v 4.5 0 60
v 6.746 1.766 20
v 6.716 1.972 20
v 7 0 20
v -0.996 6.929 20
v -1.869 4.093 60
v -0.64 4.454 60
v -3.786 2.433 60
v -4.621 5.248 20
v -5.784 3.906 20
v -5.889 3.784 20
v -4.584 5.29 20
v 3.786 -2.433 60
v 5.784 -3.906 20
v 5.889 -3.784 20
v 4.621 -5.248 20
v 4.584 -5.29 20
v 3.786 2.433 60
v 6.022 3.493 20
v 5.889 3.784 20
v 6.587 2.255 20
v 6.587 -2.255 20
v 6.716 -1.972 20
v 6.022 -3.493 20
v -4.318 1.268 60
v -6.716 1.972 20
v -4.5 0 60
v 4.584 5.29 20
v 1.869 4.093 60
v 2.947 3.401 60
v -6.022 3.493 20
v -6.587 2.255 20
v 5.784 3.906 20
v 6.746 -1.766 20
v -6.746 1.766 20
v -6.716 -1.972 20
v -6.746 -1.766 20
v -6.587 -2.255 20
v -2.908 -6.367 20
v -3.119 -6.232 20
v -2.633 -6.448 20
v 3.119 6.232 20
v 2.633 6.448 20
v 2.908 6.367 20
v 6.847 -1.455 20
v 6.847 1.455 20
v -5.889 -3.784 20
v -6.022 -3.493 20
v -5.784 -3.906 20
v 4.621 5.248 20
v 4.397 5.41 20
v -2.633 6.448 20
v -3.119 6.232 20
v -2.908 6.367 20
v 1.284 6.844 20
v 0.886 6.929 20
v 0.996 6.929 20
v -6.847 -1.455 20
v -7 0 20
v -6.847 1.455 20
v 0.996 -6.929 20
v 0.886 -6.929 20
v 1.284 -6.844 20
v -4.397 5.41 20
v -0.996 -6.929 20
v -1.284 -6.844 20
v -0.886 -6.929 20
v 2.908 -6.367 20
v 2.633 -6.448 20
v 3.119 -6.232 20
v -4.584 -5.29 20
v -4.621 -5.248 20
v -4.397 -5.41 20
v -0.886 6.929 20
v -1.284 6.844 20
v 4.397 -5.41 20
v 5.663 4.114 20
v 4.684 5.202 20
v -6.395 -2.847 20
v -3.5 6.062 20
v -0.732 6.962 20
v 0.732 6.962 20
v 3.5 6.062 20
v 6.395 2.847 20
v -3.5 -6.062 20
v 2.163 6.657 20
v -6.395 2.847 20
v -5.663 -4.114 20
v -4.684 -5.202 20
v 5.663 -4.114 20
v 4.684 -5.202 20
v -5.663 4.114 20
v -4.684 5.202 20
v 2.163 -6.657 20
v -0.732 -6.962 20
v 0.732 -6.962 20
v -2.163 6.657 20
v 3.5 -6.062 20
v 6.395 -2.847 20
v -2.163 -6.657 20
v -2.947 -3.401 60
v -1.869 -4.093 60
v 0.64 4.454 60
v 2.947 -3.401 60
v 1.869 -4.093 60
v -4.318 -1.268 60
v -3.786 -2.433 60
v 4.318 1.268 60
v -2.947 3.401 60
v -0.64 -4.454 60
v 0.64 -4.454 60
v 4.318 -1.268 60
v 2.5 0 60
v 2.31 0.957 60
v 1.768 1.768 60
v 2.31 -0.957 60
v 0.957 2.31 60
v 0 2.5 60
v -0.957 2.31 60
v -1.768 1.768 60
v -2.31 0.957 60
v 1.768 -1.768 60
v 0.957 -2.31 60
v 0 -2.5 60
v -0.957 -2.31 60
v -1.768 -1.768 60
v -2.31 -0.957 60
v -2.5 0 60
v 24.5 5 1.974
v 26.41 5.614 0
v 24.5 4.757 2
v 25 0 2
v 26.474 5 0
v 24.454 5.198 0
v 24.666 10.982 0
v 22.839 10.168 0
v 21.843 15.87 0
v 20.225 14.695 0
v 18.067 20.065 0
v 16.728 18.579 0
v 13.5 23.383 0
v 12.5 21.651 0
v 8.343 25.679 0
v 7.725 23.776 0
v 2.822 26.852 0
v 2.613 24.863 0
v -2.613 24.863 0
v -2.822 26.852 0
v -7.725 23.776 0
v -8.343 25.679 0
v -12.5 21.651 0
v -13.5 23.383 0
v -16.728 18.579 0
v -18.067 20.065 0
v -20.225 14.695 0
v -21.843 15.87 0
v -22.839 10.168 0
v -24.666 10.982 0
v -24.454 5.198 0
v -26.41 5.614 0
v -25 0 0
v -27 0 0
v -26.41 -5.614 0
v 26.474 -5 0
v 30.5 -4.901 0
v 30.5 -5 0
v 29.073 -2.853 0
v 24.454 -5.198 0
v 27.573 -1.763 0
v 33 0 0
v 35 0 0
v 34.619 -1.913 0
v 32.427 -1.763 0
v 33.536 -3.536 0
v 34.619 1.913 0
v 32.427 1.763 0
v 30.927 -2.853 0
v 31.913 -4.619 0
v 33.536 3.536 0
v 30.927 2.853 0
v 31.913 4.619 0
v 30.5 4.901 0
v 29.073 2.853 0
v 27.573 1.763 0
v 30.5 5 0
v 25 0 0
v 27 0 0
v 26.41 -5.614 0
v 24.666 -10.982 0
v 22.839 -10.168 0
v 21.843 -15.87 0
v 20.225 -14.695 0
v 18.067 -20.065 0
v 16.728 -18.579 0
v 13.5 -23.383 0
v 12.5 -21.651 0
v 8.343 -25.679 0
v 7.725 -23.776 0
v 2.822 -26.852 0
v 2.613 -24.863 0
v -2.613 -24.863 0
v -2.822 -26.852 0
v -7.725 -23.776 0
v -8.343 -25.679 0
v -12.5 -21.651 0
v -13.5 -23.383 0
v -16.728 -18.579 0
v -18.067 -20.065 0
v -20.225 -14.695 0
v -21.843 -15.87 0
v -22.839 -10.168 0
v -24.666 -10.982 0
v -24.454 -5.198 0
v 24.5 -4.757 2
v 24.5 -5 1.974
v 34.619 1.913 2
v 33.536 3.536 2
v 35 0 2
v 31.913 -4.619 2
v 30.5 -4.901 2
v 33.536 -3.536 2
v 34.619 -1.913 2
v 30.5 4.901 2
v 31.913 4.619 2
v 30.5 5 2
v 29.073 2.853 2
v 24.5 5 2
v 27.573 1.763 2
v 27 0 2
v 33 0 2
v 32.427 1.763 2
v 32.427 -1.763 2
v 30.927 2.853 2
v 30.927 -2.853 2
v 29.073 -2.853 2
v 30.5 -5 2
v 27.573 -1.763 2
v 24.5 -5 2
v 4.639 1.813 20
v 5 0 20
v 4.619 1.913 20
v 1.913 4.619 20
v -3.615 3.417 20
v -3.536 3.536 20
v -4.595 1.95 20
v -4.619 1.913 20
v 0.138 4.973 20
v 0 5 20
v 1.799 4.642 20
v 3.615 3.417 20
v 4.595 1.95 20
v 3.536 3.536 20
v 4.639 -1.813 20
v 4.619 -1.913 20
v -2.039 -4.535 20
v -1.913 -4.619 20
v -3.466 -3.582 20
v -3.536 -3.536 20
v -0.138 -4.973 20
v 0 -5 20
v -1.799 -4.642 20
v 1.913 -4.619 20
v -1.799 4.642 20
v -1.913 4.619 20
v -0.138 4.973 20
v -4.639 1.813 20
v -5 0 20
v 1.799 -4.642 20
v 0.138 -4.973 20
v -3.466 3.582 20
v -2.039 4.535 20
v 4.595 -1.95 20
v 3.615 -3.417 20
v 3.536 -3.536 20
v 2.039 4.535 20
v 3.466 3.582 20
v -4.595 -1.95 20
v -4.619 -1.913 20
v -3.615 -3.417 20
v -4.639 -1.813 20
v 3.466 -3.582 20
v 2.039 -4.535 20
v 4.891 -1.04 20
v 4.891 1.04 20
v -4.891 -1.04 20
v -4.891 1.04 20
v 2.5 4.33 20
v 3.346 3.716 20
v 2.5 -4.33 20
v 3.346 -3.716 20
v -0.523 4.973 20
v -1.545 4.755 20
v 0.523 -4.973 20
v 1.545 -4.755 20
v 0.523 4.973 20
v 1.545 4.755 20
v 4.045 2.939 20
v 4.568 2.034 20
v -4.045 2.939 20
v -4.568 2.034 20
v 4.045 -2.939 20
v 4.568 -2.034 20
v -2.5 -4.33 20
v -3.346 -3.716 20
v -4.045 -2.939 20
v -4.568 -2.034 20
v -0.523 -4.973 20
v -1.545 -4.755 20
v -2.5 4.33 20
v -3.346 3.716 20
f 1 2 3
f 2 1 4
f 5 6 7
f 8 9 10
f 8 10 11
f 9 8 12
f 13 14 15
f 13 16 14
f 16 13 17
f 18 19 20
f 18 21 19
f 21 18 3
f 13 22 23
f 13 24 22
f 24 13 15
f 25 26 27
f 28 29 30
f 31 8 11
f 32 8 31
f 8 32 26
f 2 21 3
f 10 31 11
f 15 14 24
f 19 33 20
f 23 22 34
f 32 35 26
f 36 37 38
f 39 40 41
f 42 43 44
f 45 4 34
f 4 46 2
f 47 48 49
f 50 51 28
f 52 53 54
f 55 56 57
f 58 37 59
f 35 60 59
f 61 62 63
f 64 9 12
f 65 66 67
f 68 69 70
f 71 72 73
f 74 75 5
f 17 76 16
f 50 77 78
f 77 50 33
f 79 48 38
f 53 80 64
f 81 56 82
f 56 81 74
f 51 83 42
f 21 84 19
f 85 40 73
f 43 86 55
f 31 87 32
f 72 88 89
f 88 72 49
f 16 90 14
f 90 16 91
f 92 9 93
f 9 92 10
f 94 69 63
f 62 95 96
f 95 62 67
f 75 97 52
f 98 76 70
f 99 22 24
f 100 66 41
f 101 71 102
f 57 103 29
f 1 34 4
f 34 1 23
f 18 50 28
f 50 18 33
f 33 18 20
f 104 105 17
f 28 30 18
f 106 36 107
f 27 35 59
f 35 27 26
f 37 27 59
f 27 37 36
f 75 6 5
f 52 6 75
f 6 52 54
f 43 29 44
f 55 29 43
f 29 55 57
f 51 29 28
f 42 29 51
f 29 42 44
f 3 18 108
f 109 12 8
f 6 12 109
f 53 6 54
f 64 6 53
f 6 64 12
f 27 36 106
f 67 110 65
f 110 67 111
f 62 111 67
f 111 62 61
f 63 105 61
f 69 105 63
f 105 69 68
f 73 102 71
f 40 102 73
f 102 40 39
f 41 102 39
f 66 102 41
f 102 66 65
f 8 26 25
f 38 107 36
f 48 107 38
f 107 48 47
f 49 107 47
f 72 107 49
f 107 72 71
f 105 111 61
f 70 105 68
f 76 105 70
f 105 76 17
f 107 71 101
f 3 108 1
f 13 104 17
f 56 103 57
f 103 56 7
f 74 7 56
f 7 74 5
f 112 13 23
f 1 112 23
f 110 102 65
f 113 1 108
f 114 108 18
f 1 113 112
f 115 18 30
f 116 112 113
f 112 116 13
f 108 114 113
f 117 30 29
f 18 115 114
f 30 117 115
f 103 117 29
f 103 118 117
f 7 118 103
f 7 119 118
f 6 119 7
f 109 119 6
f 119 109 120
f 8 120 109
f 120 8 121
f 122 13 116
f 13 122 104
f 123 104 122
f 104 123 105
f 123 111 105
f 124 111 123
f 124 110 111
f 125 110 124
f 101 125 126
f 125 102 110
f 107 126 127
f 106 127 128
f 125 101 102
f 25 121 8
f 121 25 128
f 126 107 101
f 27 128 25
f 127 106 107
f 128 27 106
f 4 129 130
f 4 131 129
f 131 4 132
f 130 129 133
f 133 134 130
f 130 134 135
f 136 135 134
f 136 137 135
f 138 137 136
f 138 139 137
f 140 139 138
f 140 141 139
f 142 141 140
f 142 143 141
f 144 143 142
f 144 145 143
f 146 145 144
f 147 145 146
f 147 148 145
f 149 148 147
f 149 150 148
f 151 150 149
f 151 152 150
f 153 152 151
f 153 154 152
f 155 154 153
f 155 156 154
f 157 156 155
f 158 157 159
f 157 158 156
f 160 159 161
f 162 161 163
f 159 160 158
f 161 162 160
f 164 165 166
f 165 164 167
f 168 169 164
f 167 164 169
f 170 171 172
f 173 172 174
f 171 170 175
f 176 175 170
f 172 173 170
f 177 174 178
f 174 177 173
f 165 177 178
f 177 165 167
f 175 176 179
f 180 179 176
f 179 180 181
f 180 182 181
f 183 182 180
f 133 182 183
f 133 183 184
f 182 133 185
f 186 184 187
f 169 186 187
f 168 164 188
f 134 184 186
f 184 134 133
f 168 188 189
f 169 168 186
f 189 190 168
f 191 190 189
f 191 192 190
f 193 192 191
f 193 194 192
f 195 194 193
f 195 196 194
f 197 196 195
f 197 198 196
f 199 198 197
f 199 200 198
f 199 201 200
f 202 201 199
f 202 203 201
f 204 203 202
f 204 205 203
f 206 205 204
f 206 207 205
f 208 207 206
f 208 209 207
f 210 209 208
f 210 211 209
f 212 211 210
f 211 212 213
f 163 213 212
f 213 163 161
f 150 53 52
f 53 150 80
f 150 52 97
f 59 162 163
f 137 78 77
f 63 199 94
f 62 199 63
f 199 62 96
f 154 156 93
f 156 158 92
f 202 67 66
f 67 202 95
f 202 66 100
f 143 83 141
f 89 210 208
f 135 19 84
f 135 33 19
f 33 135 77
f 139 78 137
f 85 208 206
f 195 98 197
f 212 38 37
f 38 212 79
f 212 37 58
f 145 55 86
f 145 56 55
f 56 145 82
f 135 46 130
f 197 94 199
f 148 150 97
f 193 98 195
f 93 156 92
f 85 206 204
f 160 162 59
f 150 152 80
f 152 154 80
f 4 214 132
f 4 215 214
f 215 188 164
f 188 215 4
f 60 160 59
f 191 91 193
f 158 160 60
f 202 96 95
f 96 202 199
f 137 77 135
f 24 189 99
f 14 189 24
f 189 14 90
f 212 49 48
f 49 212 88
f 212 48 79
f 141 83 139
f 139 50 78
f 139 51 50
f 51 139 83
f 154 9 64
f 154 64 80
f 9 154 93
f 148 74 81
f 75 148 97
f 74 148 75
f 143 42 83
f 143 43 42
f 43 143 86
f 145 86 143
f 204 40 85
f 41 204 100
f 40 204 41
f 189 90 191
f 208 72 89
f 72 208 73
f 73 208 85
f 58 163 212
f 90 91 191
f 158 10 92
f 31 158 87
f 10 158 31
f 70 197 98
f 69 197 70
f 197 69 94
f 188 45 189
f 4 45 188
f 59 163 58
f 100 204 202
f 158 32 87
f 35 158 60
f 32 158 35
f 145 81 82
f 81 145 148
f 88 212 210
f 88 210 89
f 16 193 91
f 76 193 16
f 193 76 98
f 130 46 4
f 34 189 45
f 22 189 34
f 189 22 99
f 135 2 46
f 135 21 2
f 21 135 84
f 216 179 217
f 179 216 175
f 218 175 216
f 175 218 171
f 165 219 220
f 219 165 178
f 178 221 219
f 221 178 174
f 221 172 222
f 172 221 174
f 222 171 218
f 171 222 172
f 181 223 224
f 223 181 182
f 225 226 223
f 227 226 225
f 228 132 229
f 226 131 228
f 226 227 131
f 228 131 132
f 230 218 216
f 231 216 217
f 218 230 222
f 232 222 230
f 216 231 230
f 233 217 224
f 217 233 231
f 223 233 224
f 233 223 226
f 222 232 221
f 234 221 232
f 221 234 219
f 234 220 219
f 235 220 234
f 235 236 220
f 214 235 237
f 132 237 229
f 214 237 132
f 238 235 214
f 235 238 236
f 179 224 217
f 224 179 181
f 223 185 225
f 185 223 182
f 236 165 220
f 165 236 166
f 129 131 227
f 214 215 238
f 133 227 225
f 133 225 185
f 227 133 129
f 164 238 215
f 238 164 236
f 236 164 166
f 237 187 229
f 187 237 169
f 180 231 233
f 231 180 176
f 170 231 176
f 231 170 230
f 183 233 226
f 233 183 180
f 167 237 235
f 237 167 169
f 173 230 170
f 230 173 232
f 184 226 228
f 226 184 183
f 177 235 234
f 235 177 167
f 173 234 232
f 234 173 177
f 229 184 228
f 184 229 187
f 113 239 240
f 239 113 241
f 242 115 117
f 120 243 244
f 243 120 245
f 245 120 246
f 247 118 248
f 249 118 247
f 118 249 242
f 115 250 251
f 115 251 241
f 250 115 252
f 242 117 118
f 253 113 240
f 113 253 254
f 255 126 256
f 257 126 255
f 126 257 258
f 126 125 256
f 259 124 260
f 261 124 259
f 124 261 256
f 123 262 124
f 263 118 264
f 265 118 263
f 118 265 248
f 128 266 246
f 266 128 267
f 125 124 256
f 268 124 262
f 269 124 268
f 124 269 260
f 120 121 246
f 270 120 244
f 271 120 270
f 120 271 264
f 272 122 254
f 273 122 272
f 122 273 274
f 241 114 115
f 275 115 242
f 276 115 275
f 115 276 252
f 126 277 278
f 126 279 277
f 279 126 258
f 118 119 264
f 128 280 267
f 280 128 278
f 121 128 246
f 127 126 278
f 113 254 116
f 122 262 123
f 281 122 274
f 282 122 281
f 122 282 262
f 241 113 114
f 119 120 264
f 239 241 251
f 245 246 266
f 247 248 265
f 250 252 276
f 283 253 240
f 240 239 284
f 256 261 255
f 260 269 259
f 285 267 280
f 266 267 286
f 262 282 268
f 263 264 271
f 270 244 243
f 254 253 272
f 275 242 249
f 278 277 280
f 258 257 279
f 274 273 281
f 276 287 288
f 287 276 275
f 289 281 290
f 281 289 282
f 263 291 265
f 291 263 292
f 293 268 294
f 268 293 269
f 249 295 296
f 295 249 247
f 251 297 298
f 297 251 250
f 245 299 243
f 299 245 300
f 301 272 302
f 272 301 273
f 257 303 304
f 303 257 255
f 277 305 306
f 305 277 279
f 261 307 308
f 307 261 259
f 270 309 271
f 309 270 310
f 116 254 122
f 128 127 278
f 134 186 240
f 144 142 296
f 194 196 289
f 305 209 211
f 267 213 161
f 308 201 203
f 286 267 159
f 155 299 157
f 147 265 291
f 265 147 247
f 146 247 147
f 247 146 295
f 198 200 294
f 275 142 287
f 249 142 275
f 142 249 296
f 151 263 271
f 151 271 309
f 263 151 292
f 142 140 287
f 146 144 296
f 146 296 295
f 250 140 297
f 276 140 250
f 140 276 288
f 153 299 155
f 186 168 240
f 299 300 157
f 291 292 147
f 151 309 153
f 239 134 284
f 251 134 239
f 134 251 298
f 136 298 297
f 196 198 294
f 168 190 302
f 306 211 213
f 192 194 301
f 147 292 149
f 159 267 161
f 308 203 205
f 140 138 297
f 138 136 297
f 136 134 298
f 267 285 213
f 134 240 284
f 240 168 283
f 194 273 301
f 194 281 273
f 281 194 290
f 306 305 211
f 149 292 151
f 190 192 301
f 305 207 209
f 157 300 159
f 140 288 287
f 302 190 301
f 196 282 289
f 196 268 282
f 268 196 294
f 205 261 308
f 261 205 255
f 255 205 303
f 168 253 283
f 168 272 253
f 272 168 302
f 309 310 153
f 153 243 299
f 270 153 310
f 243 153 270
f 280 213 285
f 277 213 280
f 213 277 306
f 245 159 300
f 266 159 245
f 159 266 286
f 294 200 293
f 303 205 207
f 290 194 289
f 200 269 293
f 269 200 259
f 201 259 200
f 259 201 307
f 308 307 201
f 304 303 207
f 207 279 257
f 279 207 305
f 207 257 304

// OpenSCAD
/*
 * CustomFunnel.scad:  A 3D printable parametric funnel
 * 
 * Written by Steven Morlock, smorloc@gmail.com
 *
 * This script is licensed under the Creative Commons Attribution - Share Alike license:
 *     http://creativecommons.org/licenses/by-sa/3.0/
 *
 */

//preview[view:south,tilt:top]

//CUSTOMIZER VARIABLES

// in millimeters
wall_thickness = 2.0;
// in millimeters
cone_height =  20; //[[1:200]]
// Funnel interior diameter in millimeters
cone_diameter =  50; //[[1:200]]
// in millmeters
neck_height = 40; //[[1:200]]
// Top of neck interior diameter in millimeters
neck_diameter = 10; //[[1:200]]
// Exit hole interiod diameter in millimeters
exit_diameter = 5; //[[1:50]]
// Handle diameter in millmeters
handle_diameter = 10; //[[1:50]]
// Hole in handle diameter in millmeters
handle_hole_diameter = 6; //[[1:50]]

//CUSTOMIZER VARIABLES END

WallThickness = wall_thickness;
NeckHeight = neck_height;
NeckDiameter = neck_diameter;
ConeHeight =  cone_height;
ConeDiameter =  cone_diameter;
ExitDiameter = exit_diameter;
HandleDiameter = handle_diameter;
HandleHoleDiameter = handle_hole_diameter;

makeFunnel();

module makeFunnel()
{
    // Funnel
    difference() {
        union() {
            // Outside of funnel
            funnel(
                    ConeHeight, 
                    ConeDiameter,
                    NeckHeight, 
                    NeckDiameter, 
                    ExitDiameter, 
                    WallThickness);
                    

            // Handle
            translate([ConeDiameter / 2 + WallThickness + HandleHoleDiameter / 2, 0, 0]) {
                difference() {
                    union() {
                        cylinder(WallThickness, r1 = HandleDiameter / 2, r2 = HandleDiameter / 2);
                        translate ([-HandleDiameter / 4, 0, WallThickness / 2]) {
                            cube([HandleHoleDiameter, HandleDiameter, WallThickness], center = true);
                        }
                    }
                    cylinder(WallThickness, r1 = HandleHoleDiameter / 2, r2 = HandleHoleDiameter/ 2);
                }
            }
        }
        
        // Interior of funnel
        funnel(
                ConeHeight, 
                ConeDiameter,
                NeckHeight, 
                NeckDiameter, 
                ExitDiameter, 
                0);
    }
}

module funnel(coneHeight, coneDiameter, neckHeight, neckDiameter, exitDiameter, wallThickness)
{
	union() {
        // Neck
		translate([0, 0, coneHeight]) {
			cylinder(
                    neckHeight, 
                    r1 = neckDiameter/2 + wallThickness, 
                    r2 = exitDiameter/2 + wallThickness);
		}
        // Cone
        cylinder(
                coneHeight, 
                r1 = coneDiameter/2 + wallThickness, 
                r2 = neckDiameter/2 + wallThickness);
	}
}
